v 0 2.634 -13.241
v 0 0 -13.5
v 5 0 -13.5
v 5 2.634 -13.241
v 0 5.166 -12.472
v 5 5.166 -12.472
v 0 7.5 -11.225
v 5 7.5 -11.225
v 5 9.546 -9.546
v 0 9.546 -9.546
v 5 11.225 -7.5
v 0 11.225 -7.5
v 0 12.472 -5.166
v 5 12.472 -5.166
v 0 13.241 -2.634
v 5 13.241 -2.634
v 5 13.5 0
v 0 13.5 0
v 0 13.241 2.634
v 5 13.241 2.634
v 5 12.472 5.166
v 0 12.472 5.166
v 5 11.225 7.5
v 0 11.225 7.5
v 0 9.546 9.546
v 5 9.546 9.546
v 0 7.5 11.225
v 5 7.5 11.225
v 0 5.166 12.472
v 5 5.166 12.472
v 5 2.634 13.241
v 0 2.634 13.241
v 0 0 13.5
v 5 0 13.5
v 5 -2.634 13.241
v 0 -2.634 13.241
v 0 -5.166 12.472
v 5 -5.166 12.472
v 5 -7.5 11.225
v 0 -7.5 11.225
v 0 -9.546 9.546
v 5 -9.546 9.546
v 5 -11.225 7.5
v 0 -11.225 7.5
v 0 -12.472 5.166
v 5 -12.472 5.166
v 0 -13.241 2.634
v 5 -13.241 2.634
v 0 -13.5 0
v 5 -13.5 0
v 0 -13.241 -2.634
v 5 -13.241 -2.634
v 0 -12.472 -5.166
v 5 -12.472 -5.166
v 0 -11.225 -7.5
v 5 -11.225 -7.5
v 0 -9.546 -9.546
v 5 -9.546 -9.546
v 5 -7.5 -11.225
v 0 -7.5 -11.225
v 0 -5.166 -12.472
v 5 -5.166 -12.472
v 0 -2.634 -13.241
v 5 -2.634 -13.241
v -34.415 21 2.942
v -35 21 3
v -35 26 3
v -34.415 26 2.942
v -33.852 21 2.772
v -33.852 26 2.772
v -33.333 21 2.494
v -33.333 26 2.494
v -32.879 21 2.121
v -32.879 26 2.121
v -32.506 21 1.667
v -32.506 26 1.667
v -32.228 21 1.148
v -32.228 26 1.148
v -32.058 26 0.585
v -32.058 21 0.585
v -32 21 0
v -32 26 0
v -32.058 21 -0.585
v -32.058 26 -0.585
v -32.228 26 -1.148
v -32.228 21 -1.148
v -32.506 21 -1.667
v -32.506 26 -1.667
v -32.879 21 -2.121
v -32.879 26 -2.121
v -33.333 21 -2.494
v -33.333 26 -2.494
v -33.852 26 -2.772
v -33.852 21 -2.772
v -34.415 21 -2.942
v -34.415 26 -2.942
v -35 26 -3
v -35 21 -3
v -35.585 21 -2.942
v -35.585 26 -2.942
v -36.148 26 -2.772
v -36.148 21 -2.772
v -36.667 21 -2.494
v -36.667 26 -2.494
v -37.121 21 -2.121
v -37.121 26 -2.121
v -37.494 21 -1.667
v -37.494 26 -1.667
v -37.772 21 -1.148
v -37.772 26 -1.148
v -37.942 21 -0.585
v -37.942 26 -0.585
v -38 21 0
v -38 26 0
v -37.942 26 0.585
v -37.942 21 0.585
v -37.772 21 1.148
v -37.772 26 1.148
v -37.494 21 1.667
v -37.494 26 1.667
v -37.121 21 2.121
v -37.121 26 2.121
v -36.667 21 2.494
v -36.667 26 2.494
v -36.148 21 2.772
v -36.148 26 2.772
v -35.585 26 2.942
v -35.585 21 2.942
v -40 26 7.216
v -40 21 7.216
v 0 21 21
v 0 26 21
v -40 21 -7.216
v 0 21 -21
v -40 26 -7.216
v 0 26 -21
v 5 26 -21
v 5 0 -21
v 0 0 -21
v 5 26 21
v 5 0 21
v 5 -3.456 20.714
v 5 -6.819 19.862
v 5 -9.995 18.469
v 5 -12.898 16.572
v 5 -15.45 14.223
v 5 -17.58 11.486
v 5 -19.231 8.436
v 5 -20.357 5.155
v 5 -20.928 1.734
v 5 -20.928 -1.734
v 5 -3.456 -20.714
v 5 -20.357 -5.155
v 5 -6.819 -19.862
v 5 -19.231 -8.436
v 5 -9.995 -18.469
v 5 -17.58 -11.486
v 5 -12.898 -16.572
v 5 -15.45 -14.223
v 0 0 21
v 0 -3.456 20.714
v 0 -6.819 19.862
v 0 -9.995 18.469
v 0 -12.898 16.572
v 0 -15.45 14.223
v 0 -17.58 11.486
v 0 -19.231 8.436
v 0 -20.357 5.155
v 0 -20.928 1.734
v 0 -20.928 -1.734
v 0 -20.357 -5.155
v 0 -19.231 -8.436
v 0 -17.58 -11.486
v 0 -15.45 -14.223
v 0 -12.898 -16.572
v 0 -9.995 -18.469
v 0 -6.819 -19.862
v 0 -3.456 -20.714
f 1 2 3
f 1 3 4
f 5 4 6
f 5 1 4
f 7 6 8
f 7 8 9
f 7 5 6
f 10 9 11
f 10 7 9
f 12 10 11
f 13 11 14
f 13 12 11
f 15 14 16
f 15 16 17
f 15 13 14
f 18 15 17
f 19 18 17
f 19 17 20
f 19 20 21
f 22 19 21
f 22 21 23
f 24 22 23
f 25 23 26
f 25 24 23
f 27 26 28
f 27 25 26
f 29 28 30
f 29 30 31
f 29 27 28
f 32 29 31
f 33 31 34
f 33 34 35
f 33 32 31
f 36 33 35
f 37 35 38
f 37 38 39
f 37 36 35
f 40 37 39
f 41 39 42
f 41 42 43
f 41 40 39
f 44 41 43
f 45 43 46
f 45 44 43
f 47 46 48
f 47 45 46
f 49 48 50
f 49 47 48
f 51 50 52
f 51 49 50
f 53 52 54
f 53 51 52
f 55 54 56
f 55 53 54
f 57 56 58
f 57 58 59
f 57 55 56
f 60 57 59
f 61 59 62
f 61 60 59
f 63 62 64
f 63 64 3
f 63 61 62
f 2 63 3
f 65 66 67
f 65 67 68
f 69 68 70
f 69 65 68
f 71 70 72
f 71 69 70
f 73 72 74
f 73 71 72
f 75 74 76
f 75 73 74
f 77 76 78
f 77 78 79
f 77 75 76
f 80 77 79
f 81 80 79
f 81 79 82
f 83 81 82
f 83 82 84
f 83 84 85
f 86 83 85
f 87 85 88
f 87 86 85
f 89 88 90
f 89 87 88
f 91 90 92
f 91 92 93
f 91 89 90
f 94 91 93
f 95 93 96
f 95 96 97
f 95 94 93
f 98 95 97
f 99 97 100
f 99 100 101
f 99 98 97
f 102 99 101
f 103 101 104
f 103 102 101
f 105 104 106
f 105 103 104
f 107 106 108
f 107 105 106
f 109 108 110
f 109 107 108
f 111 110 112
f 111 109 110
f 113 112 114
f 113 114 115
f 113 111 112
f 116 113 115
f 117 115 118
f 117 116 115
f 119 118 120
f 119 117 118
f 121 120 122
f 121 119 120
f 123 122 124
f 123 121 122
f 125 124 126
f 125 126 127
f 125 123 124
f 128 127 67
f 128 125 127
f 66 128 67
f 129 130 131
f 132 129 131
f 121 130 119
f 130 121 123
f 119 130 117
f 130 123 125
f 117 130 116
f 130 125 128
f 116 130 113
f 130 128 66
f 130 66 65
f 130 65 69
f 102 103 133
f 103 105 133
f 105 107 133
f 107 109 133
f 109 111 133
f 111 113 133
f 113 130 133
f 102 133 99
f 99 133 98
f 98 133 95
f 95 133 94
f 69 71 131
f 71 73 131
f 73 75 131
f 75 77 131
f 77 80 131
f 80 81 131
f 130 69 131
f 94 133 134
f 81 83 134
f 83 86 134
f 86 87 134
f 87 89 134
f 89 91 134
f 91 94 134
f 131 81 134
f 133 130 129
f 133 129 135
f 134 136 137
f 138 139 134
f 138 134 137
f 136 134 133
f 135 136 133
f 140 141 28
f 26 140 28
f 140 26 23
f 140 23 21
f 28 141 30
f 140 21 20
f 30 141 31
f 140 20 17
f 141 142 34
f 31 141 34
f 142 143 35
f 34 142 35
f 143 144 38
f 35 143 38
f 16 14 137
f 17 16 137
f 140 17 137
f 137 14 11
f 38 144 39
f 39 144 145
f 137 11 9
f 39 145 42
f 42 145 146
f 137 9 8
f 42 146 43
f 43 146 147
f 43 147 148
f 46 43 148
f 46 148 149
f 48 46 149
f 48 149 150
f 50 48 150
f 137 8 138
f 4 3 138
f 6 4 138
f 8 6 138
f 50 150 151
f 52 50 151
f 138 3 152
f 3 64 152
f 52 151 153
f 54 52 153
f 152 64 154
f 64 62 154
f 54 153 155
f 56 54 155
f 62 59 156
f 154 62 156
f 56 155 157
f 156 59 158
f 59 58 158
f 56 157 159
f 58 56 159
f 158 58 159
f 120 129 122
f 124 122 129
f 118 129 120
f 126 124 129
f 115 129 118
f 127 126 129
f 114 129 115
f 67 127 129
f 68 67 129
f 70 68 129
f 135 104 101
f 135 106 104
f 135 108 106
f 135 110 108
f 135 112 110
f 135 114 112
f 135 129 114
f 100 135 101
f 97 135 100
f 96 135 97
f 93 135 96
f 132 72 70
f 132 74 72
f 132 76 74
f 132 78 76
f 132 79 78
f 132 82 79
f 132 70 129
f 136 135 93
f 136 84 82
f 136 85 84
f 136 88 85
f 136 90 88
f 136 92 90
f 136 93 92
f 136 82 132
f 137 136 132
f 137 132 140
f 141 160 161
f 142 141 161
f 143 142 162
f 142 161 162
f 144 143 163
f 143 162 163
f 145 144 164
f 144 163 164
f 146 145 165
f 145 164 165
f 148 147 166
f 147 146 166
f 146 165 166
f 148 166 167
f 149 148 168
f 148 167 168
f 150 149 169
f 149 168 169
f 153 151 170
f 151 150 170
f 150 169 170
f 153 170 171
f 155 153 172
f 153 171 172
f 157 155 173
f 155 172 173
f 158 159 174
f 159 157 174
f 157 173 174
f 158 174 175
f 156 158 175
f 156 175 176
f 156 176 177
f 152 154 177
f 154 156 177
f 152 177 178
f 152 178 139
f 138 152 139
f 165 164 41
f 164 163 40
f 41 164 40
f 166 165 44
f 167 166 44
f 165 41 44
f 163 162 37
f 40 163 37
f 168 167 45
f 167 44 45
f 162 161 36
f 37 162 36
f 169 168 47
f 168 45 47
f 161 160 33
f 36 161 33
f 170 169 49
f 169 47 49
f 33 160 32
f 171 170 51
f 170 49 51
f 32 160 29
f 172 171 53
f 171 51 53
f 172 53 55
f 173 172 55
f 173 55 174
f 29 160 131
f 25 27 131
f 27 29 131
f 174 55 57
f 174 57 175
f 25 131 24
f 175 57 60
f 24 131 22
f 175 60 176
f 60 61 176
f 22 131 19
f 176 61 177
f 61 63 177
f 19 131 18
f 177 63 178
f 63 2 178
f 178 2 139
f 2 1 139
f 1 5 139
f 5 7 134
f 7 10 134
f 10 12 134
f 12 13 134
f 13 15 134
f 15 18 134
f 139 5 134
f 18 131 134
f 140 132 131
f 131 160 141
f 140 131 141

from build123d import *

# Parameters (mm, degrees)
SKETCH1_R                = 21
SKETCH1_R_2              = 13.5
BOSS_EXTRUDE1_DEPTH      = 5
BOSS_EXTRUDE2_REACH      = 49.223
BOSS_EXTRUDE2_END_RADIUS = 21
SKETCH2_W                = 5
SKETCH2_H                = 42
SKETCH2_3_W              = 45
SKETCH2_3_H              = 42
SKETCH2_3_R              = 3
BOSS_EXTRUDE3_DEPTH      = 5
CUT_EXTRUDE4_DEPTH       = 62.684682053


with BuildPart() as part:
    # Sketch1 → Boss-Extrude1 (new body)
    with BuildSketch(Plane(origin=(0, 0, 0), x_dir=(0, 0, -1), z_dir=(1, 0, 0))):
        Circle(SKETCH1_R)
        Circle(SKETCH1_R_2, mode=Mode.SUBTRACT)
    extrude(amount=BOSS_EXTRUDE1_DEPTH)

    # Boss-Extrude2: up to this cylinder (the profile starts outside it)
    boss_extrude2_end = Plane(origin=(2.5, 0, 0), z_dir=(-1, 0, 0)) * Cylinder(BOSS_EXTRUDE2_END_RADIUS, 141.446, mode=Mode.PRIVATE)
    # Sketch2 → Boss-Extrude2 (add, up to the surface)
    with BuildSketch(Plane(origin=(0, 21, 0), x_dir=(1, 0, 0), z_dir=(0, 1, 0)), mode=Mode.PRIVATE) as boss_extrude2_sk1:
        with Locations((2.5, 0)):
            Rectangle(SKETCH2_W, SKETCH2_H)
    boss_extrude2_tool1 = extrude(boss_extrude2_sk1.sketch, amount=-BOSS_EXTRUDE2_REACH, mode=Mode.PRIVATE) - boss_extrude2_end
    add(boss_extrude2_tool1.solids().sort_by_distance((2.5, 21, 0))[0])
    add(boss_extrude2_tool1.solids().sort_by_distance((2.5, 21, 0))[1])

    # Sketch2<3> → Boss-Extrude3 (add)
    with BuildSketch(Plane(origin=(0, 21, 0), x_dir=(1, 0, 0), z_dir=(0, 1, 0))):
        with Locations((-17.5, 0)):
            Rectangle(SKETCH2_3_W, SKETCH2_3_H)
        with Locations((-35, 0)):
            Circle(SKETCH2_3_R, mode=Mode.SUBTRACT)
    extrude(amount=BOSS_EXTRUDE3_DEPTH)

    # Sketch3 → Cut-Extrude4 (cut, through all)
    with BuildSketch(Plane.XZ.offset(-21)):
        Polygon((-40, -7.216009452), (-40, -28.471778575), (0, -28.471778575), (0, -21), align=None)
        Polygon((-40, 27.25128432), (-40, 7.216009452), (0, 21), (0, 27.25128432), align=None)
    extrude(amount=-CUT_EXTRUDE4_DEPTH, mode=Mode.SUBTRACT)


solid = part.part
